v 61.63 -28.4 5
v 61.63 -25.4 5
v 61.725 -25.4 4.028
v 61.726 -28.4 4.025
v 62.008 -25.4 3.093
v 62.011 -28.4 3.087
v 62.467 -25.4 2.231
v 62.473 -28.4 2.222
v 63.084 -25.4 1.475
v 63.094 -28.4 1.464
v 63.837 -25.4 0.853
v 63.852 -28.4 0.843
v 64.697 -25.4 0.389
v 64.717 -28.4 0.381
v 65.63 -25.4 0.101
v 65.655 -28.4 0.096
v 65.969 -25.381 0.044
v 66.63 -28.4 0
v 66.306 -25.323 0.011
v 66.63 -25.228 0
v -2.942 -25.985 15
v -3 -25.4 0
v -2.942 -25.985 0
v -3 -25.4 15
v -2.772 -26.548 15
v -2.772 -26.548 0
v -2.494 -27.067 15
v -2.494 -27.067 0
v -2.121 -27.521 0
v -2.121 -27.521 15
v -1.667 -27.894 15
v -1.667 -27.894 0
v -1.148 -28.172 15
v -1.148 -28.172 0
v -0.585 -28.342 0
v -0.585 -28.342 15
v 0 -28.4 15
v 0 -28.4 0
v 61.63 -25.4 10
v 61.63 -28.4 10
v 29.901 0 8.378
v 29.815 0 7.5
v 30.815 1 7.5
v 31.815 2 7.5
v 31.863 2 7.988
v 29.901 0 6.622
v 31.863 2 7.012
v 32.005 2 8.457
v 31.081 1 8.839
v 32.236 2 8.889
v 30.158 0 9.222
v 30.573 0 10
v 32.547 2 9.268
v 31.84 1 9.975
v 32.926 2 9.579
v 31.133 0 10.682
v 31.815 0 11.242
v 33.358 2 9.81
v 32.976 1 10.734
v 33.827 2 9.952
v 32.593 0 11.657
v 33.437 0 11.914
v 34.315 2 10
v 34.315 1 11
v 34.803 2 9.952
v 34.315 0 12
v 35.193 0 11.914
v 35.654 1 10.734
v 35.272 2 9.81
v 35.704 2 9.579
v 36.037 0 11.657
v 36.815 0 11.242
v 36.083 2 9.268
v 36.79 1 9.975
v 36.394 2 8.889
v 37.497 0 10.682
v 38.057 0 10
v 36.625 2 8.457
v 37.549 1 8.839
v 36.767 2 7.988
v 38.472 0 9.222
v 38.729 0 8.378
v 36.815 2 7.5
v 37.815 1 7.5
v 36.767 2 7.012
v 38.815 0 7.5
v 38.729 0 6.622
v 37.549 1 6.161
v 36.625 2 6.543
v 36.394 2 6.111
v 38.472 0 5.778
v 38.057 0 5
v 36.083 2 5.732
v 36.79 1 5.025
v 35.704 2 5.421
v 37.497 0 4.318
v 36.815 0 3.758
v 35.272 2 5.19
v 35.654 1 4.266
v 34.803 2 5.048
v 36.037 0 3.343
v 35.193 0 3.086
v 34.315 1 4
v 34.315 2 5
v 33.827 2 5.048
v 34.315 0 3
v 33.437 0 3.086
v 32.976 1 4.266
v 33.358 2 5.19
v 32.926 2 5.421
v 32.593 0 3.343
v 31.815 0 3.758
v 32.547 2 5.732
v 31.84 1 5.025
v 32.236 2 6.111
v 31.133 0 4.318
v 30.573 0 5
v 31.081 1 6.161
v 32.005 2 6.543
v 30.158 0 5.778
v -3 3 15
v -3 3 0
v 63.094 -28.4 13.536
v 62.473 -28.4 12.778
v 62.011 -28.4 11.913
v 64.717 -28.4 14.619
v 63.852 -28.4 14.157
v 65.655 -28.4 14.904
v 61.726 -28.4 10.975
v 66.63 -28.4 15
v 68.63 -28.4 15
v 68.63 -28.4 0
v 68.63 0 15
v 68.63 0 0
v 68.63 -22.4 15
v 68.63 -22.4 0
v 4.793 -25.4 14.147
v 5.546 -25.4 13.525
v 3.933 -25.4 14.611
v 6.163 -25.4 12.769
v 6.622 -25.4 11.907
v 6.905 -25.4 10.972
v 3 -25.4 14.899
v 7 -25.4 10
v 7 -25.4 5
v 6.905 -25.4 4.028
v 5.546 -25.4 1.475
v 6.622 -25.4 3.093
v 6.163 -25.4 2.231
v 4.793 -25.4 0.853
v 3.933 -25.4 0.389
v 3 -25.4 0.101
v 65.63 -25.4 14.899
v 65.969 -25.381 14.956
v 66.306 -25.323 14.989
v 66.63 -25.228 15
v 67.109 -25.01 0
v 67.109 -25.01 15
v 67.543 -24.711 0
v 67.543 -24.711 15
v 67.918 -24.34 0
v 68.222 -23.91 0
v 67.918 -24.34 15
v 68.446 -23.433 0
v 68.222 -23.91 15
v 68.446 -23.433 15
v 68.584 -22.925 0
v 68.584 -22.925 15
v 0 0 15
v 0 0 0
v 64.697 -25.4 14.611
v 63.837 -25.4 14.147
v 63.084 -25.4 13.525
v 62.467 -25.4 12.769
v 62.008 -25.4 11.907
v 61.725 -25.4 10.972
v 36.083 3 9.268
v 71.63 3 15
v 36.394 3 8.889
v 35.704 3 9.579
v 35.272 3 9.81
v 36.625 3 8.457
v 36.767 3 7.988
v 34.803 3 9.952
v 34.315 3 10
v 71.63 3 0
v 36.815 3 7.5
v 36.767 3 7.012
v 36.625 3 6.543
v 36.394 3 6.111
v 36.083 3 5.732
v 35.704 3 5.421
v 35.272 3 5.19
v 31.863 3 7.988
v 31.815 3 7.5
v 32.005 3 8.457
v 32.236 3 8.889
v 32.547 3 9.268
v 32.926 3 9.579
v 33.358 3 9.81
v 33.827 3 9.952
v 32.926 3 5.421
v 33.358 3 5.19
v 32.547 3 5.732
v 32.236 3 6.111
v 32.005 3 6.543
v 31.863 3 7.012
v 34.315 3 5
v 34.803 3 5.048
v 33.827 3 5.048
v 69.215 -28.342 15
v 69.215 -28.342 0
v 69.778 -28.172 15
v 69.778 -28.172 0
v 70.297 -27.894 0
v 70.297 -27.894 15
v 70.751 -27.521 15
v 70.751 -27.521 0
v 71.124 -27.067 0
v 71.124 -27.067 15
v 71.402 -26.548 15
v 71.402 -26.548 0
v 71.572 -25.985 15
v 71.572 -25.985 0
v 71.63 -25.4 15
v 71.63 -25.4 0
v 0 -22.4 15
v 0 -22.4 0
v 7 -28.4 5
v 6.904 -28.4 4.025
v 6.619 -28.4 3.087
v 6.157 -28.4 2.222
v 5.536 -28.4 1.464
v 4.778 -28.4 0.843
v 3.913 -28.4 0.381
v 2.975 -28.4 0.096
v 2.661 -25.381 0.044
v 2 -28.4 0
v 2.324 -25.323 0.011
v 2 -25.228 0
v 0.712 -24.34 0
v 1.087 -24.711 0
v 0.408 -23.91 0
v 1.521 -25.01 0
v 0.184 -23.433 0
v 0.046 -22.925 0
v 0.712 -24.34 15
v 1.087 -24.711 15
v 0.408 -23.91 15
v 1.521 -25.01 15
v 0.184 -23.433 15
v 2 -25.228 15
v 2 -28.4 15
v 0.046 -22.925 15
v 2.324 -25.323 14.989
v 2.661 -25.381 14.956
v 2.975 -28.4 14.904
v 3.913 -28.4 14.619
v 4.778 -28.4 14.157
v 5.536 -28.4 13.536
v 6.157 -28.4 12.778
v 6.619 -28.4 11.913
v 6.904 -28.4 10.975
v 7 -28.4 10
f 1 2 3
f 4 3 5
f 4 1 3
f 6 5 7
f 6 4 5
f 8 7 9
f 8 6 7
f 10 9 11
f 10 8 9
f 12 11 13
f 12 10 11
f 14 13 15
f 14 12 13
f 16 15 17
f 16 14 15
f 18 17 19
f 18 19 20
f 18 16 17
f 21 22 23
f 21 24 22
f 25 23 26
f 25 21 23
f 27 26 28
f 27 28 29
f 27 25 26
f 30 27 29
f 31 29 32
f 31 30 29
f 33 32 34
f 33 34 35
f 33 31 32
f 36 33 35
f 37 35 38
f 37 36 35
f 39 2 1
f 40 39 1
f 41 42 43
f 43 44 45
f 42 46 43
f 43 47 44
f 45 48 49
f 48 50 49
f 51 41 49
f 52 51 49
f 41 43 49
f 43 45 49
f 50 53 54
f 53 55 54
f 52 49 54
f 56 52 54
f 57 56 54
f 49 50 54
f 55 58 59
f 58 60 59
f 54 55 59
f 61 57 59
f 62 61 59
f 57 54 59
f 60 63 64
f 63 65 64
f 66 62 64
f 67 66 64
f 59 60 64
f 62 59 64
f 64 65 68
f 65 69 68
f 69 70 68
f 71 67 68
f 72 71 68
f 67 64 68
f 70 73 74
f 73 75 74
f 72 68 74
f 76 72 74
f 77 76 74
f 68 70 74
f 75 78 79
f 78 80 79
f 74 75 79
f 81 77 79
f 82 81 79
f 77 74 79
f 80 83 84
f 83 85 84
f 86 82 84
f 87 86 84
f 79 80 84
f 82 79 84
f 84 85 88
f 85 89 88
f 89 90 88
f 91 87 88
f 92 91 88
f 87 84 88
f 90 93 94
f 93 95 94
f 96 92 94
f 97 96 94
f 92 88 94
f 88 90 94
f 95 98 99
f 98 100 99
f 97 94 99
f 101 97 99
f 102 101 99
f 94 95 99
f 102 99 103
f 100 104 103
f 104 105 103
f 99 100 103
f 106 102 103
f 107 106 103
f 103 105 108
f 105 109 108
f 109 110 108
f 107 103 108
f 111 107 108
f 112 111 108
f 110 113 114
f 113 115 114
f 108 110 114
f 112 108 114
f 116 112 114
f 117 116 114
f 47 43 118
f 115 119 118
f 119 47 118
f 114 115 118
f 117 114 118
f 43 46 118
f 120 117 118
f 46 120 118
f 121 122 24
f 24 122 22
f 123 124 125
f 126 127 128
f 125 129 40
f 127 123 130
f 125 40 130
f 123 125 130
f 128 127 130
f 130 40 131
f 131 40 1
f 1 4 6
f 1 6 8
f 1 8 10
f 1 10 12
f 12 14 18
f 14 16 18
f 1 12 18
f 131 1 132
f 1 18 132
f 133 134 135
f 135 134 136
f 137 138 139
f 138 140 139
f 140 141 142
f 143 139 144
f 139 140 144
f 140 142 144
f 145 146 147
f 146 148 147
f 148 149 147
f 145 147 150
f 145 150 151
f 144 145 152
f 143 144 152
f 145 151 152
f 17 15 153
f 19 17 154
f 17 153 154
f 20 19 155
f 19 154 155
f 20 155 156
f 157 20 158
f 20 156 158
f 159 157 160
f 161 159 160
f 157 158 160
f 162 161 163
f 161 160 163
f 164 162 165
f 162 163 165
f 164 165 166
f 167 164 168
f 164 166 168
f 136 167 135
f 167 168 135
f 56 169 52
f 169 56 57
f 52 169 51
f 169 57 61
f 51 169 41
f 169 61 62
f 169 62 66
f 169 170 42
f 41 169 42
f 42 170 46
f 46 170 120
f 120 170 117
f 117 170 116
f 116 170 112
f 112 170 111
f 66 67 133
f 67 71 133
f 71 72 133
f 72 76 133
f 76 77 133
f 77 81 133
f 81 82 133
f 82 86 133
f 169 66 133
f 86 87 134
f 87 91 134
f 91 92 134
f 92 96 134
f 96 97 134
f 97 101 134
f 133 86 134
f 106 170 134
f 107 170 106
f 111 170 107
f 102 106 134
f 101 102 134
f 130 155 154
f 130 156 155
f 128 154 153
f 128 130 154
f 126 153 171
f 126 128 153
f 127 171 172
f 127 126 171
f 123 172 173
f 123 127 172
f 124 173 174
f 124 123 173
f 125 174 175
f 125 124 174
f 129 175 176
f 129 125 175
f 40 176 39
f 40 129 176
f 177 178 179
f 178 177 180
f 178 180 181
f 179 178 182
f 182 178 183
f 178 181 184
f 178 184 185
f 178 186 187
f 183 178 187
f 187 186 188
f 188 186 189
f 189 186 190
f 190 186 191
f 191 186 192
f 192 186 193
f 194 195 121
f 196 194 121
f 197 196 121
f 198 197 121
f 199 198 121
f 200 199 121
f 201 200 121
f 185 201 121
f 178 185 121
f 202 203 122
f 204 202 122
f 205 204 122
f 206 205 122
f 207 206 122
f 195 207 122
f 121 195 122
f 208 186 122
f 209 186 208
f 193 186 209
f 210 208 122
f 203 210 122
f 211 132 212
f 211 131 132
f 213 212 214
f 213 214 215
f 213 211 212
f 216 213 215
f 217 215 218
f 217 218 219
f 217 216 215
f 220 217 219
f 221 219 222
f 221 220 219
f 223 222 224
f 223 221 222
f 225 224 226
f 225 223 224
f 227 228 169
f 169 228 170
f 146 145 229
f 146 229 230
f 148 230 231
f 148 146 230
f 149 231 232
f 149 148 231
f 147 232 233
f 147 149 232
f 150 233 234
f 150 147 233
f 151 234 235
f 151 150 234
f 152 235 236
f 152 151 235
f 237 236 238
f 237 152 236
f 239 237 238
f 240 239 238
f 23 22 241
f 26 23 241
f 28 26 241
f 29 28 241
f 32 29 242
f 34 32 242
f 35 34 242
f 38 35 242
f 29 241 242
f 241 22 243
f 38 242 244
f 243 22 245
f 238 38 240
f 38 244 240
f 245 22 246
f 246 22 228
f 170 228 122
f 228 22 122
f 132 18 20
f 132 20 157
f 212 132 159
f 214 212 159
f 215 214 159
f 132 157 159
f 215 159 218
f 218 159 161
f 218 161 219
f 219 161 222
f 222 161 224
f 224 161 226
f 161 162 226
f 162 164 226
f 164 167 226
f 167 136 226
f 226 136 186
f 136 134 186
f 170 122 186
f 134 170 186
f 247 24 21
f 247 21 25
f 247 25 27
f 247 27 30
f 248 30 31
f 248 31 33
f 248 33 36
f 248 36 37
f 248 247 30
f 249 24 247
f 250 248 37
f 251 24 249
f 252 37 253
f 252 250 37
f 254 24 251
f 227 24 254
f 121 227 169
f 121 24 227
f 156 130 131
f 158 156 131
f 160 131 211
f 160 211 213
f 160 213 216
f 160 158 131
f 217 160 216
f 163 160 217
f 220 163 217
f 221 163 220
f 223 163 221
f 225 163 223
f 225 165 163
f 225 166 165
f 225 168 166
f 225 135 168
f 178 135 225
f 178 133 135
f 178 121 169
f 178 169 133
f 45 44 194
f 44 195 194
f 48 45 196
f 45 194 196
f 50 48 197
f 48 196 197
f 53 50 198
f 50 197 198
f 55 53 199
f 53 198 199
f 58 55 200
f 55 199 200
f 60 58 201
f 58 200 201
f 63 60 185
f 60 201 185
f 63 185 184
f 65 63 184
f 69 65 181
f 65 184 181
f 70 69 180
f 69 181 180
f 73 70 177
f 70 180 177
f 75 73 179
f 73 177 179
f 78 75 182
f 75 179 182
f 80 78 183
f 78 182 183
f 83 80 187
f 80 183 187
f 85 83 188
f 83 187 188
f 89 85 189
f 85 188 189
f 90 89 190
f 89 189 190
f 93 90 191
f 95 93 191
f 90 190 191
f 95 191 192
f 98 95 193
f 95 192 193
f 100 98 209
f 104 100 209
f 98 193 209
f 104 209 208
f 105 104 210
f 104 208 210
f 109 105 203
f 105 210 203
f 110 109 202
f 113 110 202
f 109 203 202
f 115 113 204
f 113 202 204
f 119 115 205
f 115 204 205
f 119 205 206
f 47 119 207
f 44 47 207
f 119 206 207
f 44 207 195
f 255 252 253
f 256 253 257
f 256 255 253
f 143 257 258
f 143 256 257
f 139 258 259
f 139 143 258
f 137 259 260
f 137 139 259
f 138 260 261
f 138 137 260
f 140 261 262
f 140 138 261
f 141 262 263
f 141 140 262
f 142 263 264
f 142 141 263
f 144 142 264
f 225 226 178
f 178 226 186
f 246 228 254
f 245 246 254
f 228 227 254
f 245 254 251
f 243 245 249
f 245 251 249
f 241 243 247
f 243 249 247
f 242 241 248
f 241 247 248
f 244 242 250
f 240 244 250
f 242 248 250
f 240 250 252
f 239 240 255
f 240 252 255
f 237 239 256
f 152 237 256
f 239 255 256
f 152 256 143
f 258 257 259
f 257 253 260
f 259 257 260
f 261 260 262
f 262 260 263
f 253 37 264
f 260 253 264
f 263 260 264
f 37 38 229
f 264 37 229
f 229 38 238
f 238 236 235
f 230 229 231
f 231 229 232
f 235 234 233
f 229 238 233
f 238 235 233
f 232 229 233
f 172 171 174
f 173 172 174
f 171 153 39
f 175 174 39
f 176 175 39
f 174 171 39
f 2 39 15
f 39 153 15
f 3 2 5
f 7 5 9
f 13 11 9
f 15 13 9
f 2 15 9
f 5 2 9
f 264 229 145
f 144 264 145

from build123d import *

# Parameters (mm, degrees)
F1_DEPTH       = 15
F3_D           = 5
F3_DEPTH       = 11
F3_CSINK_D     = 9
F3_CSINK_ANGLE = 90
F4_R           = 5
F5_R           = 3


with BuildPart() as f1:
    # F0 (on Top) → F1 (new body)
    with BuildSketch(Plane.XY):
        Polygon((0, -25.4), (0, 0), (68.63, 0), (68.63, -25.4), (61.63, -25.4), (61.63, -28.4), (71.63, -28.4), (71.63, 3), (-3, 3), (-3, -28.4), (7, -28.4), (7, -25.4), align=None)
    extrude(amount=F1_DEPTH)

    # F3
    with Locations(Plane.XZ):
        with Locations((34.315, 7.5)):
            CounterSinkHole(F3_D / 2, F3_CSINK_D / 2, depth=F3_DEPTH, counter_sink_angle=F3_CSINK_ANGLE)

    # F4
    f4_edges = [f1.edges().sort_by_distance(p)[0] for p in [
        (7, -26.9, 15),
        (61.63, -26.9, 15),
        (7, -26.9, 0),
        (61.63, -26.9, 0),
    ]]
    fillet(f4_edges, radius=F4_R)

    # F5
    f5_edges = [f1.edges().sort_by_distance(p)[0] for p in [
        (0, -25.4, 7.5),
        (-3, -28.4, 7.5),
        (71.63, -28.4, 7.5),
        (68.63, -25.4, 7.5),
    ]]
    fillet(f5_edges, radius=F5_R)


solid = f1.part
